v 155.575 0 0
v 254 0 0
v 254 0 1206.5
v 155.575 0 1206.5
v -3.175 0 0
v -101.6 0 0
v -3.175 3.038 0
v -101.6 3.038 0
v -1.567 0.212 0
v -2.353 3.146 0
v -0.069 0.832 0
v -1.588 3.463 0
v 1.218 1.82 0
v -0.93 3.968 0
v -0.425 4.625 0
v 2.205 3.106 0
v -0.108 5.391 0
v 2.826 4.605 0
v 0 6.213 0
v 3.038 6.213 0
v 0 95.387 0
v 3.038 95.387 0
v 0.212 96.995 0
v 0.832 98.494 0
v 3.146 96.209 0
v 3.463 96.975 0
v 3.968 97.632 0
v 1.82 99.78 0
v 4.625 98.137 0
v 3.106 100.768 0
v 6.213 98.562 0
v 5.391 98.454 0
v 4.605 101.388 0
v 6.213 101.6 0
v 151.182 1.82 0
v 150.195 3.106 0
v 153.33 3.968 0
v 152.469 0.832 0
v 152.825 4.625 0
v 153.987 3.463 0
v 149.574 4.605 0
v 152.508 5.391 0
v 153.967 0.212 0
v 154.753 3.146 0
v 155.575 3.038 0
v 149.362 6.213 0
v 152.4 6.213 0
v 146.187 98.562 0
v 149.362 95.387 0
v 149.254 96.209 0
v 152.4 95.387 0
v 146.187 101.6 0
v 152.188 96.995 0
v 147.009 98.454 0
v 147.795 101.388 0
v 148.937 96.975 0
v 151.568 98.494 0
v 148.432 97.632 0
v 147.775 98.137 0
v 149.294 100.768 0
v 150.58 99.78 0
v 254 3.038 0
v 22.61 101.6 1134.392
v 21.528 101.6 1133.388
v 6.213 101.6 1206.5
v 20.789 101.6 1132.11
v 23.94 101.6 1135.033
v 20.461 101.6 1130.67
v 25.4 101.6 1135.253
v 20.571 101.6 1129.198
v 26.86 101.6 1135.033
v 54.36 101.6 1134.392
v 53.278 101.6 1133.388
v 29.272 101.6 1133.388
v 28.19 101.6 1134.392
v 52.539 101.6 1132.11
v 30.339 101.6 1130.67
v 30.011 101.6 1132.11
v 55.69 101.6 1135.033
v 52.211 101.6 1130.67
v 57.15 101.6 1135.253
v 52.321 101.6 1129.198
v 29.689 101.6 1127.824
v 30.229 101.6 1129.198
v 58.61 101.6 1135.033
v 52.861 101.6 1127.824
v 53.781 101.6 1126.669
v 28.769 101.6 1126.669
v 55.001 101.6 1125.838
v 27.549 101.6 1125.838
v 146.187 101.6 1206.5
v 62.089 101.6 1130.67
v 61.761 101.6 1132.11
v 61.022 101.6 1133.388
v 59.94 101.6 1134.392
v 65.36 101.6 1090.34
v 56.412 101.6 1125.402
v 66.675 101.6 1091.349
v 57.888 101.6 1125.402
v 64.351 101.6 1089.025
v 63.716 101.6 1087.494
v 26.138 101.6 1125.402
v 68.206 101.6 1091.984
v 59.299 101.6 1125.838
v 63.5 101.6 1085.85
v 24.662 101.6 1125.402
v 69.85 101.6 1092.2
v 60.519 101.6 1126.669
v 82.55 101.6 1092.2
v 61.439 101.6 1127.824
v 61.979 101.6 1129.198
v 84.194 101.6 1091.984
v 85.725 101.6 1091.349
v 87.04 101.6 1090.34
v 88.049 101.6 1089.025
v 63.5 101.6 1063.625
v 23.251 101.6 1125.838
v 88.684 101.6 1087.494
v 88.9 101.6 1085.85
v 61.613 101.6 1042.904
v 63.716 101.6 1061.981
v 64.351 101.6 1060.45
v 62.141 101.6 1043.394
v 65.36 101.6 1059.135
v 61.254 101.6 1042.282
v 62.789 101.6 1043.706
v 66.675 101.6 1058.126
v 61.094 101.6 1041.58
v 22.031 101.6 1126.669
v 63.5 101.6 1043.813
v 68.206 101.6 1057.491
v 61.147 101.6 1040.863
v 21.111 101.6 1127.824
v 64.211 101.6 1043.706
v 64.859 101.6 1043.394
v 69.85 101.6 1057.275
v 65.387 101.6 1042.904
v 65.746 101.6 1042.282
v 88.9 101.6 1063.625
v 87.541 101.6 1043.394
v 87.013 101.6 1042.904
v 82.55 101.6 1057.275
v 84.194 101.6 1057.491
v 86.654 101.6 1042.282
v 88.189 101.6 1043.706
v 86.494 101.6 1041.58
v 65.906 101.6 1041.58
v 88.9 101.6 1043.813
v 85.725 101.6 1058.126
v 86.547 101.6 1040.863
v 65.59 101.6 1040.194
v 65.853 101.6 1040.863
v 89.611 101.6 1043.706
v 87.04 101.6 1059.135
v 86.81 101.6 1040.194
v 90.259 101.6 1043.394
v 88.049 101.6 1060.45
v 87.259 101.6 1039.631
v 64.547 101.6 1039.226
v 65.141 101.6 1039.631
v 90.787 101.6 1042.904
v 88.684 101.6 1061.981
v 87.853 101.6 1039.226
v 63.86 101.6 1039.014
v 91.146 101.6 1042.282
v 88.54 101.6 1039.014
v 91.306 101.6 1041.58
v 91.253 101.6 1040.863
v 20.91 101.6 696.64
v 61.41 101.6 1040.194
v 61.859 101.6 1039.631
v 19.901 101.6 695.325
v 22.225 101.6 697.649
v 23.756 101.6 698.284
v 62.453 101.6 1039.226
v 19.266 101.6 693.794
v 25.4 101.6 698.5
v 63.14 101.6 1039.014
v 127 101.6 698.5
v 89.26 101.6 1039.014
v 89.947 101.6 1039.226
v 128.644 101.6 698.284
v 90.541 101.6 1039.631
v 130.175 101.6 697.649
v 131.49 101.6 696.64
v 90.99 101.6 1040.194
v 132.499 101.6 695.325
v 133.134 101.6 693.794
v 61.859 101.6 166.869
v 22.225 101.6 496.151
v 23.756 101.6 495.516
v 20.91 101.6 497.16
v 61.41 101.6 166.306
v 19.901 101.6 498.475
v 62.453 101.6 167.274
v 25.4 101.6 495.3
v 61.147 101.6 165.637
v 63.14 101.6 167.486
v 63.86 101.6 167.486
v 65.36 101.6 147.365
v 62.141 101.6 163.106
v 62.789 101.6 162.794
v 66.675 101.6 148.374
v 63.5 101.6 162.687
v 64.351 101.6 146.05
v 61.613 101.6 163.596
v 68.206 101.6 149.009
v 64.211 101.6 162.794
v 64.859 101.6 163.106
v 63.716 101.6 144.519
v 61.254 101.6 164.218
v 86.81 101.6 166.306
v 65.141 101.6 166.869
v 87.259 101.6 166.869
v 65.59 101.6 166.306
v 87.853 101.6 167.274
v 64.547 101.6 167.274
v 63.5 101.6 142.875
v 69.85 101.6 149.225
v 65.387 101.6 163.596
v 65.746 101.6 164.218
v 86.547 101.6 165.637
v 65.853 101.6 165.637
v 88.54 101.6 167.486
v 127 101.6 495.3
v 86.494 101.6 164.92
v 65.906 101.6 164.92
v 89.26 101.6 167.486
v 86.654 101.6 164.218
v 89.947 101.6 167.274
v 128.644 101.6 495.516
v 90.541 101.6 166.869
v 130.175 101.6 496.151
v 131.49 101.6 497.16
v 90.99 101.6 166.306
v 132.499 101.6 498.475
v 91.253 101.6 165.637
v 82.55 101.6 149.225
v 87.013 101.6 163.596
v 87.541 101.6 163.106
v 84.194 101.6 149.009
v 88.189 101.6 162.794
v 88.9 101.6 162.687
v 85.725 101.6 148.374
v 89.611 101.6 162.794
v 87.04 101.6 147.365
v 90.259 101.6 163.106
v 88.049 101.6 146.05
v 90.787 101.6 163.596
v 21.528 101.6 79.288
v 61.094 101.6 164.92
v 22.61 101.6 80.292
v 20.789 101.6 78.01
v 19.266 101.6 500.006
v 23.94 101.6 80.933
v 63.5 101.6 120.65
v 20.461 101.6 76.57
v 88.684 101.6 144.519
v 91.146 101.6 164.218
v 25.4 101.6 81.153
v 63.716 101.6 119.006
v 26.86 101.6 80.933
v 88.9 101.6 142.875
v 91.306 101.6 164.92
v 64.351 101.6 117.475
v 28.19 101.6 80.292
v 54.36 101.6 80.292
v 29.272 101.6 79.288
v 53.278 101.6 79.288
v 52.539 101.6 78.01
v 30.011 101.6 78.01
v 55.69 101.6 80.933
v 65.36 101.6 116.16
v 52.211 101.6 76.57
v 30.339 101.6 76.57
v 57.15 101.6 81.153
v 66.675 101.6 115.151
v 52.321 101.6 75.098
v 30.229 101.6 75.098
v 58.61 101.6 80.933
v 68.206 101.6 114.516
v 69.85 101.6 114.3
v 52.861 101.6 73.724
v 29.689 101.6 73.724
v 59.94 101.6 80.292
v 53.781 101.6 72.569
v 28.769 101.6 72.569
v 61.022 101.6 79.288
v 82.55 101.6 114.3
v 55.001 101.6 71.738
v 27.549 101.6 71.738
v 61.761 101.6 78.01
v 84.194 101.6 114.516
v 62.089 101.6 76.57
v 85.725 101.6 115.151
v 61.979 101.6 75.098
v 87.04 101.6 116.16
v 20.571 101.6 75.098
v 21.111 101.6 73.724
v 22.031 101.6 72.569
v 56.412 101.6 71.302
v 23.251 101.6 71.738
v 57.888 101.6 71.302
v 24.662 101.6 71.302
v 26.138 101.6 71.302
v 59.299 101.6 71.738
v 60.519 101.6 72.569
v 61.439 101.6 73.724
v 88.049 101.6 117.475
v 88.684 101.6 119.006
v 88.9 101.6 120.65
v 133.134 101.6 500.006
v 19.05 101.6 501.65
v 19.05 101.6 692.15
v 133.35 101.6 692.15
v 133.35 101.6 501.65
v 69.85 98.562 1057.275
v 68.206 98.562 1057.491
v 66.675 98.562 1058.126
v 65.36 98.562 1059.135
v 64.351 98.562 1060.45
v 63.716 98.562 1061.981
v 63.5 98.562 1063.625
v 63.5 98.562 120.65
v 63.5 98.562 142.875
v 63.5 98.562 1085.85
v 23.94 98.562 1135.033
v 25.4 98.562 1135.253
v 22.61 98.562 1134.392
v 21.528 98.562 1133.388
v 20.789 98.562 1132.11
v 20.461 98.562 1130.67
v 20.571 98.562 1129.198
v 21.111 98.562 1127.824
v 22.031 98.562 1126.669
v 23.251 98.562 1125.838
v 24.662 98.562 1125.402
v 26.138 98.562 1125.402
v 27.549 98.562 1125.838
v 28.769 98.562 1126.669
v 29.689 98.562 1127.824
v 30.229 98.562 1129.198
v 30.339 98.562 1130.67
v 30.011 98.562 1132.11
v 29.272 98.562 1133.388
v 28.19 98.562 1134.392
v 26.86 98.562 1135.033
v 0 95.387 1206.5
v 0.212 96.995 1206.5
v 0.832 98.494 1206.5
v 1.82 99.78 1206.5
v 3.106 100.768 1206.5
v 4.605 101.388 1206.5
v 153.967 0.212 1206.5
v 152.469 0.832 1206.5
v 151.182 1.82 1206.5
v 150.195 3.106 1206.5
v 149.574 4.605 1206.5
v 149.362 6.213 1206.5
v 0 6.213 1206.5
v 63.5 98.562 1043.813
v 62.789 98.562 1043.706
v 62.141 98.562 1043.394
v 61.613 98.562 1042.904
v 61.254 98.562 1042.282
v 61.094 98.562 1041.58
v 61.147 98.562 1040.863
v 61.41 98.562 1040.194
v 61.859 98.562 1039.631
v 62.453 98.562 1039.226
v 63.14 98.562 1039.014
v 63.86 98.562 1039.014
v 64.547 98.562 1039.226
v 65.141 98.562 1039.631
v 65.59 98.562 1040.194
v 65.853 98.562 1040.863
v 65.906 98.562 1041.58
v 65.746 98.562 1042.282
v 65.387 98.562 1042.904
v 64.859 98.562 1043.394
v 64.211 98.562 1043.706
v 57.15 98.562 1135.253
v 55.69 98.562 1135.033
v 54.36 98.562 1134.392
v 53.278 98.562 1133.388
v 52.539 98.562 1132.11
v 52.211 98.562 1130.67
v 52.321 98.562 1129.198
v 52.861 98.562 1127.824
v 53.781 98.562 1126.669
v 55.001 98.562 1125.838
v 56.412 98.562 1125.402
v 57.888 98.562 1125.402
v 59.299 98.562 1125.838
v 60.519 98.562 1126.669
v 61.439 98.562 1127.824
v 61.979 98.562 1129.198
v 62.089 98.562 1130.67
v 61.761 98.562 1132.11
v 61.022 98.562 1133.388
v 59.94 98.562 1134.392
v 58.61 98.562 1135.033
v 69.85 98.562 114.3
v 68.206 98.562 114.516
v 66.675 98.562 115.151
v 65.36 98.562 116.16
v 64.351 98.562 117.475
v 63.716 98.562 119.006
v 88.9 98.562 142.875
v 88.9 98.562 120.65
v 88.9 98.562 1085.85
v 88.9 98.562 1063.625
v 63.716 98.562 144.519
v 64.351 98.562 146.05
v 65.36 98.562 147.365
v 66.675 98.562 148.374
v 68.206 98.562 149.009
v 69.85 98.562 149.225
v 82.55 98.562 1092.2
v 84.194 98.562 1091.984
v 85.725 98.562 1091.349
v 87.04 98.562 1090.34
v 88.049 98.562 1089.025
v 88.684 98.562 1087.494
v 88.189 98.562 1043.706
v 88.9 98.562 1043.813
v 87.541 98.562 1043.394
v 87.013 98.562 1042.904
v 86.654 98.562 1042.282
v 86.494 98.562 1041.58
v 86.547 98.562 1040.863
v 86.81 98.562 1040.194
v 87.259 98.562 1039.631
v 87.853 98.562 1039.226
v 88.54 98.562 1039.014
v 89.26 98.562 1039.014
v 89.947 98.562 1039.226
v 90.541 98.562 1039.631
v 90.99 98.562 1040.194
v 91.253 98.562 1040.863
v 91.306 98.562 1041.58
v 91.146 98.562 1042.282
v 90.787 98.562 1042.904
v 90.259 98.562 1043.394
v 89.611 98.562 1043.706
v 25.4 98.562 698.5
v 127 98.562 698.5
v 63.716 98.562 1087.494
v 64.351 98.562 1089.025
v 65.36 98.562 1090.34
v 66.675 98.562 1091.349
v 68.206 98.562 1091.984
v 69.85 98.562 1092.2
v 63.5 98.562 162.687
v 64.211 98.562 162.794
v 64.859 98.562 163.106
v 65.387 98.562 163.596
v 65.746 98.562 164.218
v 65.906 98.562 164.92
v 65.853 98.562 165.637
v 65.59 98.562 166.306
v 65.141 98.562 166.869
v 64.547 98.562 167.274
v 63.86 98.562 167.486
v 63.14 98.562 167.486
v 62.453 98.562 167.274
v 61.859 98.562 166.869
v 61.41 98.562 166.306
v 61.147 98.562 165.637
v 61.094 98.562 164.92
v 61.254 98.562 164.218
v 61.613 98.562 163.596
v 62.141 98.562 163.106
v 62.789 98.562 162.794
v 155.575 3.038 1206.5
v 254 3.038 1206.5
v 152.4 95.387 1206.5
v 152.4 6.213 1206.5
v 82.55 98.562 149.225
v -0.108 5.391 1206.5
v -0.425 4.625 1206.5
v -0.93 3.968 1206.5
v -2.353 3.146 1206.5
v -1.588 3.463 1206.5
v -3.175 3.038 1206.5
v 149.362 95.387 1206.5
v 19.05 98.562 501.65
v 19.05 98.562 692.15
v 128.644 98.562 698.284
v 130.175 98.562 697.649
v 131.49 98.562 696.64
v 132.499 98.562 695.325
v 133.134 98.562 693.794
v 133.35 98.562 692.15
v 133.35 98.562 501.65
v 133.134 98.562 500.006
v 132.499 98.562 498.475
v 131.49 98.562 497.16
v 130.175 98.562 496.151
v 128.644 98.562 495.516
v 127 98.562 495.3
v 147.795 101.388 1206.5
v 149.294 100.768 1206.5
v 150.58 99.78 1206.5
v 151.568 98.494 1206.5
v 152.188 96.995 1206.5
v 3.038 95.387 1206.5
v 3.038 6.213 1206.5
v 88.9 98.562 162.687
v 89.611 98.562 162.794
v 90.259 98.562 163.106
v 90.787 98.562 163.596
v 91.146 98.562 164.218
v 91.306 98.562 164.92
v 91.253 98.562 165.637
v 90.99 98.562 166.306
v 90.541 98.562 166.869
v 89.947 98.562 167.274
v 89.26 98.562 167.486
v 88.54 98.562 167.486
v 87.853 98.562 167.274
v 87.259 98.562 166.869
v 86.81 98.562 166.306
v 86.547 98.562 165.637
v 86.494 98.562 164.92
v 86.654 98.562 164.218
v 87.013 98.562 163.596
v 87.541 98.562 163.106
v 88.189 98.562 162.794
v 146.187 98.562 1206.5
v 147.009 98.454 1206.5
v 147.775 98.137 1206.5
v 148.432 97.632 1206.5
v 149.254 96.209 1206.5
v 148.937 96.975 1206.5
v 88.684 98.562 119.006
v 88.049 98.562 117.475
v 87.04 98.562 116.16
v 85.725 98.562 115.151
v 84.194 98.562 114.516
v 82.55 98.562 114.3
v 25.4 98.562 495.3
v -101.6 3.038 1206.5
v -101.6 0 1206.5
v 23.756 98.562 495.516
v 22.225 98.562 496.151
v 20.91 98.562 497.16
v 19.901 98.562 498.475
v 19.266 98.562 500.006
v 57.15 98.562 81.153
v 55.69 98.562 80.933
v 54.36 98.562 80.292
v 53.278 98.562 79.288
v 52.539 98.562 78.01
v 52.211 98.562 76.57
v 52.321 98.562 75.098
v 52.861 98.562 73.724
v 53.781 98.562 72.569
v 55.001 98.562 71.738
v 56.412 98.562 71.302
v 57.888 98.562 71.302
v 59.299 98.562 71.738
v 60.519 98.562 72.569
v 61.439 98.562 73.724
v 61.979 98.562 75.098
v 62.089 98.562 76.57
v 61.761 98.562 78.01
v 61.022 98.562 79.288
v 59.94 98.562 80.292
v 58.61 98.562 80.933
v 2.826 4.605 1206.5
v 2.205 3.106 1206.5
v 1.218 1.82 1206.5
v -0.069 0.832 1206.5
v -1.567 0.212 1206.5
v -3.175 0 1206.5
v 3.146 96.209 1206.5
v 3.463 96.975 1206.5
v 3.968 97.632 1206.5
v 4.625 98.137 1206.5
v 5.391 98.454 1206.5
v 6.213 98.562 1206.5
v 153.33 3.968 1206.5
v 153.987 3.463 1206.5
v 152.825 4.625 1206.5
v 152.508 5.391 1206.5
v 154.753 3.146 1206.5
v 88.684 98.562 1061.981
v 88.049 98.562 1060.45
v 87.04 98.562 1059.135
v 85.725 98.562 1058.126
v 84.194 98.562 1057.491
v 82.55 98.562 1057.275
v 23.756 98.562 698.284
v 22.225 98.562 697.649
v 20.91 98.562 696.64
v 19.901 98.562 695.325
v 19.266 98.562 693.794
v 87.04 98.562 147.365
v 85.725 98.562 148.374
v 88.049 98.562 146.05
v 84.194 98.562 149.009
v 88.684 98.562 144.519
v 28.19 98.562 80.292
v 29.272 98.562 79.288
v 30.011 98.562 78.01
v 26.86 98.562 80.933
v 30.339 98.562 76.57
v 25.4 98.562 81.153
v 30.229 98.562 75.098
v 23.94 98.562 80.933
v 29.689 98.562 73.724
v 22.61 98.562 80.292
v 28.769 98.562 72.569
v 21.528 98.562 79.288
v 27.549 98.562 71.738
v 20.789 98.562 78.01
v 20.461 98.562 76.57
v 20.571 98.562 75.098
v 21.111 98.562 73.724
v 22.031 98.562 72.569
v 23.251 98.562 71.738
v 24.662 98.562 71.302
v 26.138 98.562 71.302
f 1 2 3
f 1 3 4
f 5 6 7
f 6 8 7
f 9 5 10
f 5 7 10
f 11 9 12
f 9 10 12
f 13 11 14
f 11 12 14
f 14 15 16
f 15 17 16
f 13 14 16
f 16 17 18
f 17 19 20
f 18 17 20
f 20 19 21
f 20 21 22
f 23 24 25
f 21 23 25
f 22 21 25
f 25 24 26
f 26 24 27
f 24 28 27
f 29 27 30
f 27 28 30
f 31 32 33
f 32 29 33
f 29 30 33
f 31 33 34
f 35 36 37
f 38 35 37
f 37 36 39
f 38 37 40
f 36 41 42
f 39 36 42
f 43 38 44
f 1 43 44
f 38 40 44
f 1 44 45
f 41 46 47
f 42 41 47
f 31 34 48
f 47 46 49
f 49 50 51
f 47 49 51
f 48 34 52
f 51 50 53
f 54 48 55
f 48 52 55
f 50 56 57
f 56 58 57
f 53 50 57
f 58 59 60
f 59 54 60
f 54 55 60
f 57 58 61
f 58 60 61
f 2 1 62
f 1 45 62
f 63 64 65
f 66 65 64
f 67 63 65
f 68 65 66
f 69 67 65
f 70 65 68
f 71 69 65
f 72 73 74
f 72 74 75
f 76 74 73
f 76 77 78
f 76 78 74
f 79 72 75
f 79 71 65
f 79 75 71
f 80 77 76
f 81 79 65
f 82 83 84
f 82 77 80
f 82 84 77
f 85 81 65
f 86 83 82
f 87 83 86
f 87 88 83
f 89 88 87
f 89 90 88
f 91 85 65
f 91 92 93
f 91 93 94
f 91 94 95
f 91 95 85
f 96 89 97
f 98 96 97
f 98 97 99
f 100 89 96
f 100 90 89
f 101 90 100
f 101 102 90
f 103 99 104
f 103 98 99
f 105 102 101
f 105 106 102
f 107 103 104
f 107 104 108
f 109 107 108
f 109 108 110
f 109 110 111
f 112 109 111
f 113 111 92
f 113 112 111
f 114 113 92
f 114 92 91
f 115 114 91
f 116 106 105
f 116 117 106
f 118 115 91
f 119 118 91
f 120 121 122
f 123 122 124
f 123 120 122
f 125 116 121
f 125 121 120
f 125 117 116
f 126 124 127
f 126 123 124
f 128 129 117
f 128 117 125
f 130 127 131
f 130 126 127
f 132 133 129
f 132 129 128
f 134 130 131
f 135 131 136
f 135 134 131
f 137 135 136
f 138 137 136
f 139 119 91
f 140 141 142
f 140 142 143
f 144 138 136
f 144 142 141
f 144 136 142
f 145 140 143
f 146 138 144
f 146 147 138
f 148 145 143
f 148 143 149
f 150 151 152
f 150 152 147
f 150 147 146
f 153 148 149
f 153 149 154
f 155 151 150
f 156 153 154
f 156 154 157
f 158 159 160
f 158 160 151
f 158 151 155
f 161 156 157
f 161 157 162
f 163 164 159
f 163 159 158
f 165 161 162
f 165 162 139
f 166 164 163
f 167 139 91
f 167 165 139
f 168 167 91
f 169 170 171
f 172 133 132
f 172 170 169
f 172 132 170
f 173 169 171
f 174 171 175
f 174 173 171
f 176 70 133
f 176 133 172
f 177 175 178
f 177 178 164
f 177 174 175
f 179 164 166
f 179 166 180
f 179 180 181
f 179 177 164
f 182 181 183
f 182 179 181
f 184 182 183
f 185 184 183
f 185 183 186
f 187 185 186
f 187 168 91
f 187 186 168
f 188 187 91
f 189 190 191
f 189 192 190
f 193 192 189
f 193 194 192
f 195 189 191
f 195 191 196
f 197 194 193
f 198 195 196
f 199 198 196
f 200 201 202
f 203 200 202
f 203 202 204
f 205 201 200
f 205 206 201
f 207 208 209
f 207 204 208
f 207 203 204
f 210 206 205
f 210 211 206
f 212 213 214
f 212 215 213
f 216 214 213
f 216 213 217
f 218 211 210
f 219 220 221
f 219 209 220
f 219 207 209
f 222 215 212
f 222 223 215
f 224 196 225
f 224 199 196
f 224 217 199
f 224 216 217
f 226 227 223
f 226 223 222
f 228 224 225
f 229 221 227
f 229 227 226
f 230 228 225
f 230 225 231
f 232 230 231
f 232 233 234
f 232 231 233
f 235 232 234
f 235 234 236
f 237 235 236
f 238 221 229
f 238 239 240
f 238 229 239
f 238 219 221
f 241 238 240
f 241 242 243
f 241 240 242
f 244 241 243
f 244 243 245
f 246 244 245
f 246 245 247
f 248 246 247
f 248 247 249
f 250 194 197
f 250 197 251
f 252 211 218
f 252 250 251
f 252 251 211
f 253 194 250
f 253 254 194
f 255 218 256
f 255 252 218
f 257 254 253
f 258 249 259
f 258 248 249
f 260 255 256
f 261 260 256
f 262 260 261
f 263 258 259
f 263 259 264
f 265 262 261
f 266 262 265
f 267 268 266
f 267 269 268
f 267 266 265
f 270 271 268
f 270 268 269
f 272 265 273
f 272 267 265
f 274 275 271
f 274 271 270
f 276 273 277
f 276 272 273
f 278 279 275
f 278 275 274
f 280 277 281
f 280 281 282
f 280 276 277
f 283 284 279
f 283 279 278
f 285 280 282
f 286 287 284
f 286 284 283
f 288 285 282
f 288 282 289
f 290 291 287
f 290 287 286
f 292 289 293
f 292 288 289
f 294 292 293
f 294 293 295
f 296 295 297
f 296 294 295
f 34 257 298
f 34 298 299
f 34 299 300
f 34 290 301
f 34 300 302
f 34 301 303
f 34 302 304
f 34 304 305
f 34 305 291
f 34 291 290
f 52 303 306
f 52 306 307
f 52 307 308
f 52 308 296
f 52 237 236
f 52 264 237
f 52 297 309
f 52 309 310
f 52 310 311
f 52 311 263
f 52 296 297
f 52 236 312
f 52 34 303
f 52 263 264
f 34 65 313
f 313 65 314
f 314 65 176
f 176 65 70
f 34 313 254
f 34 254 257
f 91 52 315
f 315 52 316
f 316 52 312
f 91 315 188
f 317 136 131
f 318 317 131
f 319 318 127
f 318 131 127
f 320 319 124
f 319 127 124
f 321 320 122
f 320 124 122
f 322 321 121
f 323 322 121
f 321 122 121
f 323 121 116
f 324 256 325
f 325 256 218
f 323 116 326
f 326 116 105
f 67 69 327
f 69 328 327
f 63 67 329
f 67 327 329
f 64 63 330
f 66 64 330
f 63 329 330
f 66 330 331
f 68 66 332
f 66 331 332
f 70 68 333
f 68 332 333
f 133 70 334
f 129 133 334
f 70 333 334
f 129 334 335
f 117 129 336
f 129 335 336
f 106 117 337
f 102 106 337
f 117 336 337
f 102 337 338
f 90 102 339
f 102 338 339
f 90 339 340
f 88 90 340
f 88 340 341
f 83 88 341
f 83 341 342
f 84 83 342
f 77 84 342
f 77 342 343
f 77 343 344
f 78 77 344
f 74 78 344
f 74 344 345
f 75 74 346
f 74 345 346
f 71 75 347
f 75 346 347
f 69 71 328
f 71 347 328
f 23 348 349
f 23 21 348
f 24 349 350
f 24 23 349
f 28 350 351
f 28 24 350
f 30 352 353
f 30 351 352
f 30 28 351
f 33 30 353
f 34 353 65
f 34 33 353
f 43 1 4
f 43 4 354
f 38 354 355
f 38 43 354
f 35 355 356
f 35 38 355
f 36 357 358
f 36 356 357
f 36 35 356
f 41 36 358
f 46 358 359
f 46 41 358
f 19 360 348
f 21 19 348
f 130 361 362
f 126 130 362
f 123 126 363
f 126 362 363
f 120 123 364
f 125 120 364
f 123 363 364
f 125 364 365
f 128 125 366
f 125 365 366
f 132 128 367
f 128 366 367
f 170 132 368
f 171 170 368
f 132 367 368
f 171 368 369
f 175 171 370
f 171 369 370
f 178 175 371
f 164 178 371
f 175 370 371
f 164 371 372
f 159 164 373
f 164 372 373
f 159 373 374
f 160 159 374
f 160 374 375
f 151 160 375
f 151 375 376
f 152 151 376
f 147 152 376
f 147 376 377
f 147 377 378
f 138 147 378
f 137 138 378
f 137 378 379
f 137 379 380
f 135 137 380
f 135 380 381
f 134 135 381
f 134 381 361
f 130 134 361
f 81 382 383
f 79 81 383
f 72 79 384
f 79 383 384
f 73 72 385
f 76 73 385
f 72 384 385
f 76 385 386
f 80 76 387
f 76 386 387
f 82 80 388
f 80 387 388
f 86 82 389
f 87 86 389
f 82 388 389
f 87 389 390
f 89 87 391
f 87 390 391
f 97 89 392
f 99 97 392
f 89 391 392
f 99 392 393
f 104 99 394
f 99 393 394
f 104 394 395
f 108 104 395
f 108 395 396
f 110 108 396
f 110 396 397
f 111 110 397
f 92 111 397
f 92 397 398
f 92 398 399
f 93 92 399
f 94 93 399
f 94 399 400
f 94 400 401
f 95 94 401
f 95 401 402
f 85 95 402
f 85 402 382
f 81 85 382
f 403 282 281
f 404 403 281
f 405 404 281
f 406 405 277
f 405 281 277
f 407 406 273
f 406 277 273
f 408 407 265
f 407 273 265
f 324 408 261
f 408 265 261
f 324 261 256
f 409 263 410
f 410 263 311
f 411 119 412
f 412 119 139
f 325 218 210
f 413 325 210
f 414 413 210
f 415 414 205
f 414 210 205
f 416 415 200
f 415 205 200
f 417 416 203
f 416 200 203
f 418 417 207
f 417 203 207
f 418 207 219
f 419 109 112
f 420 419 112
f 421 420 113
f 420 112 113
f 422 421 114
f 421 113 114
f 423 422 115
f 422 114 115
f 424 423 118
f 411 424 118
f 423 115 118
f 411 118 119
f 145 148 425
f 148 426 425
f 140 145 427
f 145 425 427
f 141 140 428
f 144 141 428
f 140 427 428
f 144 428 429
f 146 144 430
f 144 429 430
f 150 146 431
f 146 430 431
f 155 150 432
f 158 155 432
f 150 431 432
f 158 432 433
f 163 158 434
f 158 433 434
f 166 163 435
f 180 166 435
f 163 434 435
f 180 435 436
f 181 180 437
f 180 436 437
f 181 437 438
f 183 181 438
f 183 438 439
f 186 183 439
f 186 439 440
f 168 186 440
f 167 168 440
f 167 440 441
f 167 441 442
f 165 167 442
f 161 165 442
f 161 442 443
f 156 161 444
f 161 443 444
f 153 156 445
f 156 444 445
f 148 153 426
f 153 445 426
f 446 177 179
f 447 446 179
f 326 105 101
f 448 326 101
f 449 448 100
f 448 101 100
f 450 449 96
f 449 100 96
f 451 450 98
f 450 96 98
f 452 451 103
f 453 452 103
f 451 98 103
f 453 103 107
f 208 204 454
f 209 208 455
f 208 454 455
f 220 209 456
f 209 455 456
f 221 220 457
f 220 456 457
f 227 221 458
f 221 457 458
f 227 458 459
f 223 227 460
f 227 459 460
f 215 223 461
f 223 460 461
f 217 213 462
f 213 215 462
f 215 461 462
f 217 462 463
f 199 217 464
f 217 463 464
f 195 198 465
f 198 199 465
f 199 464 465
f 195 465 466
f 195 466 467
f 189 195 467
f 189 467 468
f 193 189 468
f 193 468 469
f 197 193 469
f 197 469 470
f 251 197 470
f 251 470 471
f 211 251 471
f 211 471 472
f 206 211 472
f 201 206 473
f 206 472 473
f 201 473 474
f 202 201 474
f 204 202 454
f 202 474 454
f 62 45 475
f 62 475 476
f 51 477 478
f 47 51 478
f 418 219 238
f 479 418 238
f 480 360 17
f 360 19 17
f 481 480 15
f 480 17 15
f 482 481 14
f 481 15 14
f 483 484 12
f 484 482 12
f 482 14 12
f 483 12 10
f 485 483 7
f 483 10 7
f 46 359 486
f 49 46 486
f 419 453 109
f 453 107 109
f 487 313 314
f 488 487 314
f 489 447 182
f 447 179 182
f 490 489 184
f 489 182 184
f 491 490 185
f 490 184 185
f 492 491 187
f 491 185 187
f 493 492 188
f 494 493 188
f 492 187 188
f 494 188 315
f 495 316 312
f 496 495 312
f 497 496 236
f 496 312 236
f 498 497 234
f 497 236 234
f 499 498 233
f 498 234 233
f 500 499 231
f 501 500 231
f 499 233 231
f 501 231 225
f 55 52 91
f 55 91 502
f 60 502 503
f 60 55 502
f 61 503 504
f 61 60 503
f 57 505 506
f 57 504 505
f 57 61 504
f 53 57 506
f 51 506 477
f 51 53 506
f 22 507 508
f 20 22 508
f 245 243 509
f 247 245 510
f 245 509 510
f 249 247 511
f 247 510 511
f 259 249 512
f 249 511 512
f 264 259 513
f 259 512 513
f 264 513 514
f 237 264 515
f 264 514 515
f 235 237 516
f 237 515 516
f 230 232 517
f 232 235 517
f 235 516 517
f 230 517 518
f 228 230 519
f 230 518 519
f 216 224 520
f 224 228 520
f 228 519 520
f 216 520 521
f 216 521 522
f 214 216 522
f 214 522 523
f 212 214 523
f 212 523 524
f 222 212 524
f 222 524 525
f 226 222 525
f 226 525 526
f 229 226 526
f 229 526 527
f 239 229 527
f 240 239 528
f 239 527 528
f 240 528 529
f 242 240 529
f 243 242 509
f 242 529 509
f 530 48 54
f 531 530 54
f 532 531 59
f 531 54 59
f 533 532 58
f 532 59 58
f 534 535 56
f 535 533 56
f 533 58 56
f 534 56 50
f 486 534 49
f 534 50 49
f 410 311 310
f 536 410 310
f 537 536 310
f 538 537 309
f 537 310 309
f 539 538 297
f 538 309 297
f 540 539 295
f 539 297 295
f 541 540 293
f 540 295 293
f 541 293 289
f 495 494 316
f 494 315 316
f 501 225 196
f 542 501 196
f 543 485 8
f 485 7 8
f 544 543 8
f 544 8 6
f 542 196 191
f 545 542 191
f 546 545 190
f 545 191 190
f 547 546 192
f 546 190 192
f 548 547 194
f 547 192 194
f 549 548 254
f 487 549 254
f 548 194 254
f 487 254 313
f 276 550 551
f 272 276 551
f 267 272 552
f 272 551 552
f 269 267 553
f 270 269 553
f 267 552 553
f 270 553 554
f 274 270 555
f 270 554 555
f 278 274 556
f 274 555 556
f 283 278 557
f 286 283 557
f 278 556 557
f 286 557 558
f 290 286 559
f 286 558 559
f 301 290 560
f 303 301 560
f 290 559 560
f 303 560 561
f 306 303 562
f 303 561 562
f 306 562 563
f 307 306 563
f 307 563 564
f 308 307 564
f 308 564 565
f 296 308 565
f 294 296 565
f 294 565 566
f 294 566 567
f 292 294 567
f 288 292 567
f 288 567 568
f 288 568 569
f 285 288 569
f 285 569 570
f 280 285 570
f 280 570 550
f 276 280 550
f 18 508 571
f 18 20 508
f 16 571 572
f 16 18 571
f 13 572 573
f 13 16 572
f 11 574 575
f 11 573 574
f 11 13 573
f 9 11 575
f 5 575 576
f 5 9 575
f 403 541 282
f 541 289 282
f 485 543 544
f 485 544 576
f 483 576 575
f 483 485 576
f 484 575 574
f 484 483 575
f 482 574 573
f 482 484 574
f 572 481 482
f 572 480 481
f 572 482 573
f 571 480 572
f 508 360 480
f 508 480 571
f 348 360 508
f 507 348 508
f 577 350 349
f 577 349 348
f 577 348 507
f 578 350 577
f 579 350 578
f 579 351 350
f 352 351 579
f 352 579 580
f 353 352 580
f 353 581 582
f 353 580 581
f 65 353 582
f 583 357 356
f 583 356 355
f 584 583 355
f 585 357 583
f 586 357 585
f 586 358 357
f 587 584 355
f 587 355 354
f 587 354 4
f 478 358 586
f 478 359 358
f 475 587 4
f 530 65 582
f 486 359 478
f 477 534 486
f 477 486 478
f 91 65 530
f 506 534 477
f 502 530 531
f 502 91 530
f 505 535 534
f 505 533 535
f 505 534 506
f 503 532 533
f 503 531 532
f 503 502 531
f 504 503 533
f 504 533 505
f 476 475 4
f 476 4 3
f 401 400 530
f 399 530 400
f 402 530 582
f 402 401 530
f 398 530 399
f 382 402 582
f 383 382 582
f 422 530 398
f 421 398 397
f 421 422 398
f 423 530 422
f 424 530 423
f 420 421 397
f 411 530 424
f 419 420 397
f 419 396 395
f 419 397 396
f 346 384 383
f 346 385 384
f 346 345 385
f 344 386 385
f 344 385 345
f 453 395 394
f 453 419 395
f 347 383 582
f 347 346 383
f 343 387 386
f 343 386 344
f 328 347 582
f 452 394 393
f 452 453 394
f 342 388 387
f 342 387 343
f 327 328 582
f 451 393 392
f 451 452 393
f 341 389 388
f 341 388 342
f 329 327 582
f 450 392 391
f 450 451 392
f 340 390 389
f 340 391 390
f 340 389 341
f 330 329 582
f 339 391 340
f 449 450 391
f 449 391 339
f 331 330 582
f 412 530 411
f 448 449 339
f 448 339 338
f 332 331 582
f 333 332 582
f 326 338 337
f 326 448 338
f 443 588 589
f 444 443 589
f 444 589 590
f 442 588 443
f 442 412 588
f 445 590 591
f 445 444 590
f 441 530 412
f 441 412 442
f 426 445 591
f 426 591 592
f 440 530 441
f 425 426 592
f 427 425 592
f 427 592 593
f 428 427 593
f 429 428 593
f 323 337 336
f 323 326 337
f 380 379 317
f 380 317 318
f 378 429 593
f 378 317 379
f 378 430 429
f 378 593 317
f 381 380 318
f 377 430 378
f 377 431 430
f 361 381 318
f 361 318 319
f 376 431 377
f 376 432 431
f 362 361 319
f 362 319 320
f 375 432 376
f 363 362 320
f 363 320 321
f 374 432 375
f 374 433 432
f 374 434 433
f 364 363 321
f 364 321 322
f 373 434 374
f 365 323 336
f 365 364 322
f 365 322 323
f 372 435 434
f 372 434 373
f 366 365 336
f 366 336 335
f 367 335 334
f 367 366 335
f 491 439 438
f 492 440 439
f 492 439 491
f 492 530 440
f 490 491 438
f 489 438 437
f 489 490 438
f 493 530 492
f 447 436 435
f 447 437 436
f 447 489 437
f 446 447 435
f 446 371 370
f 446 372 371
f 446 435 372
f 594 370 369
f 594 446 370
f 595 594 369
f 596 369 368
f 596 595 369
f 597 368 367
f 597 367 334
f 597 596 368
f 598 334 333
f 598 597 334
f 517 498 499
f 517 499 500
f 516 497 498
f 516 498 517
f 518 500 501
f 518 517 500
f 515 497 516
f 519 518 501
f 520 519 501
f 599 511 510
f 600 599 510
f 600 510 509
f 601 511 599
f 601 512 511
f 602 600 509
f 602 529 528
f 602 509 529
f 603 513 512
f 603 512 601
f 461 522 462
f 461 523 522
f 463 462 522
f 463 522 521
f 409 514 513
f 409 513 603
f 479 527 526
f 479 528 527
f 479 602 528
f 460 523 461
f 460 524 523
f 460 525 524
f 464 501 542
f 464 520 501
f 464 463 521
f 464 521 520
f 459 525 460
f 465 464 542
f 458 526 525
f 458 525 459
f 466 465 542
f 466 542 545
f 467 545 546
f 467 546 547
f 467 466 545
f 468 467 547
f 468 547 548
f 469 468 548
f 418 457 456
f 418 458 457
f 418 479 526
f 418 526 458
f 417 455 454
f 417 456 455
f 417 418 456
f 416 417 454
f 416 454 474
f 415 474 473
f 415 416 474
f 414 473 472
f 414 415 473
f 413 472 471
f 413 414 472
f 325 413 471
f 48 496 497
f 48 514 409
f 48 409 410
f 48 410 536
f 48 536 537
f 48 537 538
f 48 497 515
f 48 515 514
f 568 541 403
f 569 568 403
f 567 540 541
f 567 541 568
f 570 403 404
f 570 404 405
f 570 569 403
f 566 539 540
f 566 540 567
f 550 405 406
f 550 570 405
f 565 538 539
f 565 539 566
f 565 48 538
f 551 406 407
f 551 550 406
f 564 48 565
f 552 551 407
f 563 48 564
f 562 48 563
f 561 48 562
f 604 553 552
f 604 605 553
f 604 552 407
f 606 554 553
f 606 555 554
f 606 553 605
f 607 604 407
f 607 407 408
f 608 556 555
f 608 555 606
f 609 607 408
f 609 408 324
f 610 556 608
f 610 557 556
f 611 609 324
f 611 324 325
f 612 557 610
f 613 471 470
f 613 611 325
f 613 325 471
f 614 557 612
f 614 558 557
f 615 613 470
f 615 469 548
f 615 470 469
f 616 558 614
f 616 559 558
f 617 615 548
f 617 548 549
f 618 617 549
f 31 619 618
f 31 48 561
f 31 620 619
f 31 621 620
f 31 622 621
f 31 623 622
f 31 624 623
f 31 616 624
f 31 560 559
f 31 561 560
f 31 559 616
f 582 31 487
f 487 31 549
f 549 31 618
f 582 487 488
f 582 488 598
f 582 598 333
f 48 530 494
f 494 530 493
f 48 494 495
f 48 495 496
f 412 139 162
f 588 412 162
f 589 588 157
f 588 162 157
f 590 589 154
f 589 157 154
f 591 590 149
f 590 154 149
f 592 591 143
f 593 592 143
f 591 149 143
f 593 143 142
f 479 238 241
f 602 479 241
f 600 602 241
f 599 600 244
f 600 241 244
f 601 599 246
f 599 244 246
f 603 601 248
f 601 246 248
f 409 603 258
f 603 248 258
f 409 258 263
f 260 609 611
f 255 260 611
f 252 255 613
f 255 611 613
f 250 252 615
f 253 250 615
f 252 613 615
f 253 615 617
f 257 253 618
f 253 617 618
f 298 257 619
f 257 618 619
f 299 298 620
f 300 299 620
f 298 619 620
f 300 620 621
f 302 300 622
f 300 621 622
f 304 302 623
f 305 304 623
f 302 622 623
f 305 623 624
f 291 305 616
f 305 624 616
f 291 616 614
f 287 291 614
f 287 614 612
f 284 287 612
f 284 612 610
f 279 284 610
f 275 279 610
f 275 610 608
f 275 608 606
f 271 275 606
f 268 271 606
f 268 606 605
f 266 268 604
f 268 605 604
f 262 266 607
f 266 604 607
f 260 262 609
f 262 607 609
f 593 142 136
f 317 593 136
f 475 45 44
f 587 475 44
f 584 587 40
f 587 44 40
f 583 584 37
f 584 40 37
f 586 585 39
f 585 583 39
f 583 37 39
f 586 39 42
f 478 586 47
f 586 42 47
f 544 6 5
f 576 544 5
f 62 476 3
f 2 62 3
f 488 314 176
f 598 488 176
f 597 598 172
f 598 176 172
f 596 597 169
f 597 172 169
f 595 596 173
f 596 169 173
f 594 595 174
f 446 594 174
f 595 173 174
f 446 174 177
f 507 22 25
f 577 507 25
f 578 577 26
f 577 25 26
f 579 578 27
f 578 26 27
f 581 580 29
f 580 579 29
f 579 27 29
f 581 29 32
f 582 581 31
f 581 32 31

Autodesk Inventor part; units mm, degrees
ref_plane "YZ Plane" through (0, 0, 0) normal (1, 0, 0) x (0, 1, 0)
ref_plane "XZ Plane" through (0, 0, 0) normal (0, 1, 0) x (-1, 0, 0)
sketch "Sketch1" plane through (0, 0, 0) normal (0, 0, 1) x (1, 0, 0)
  line L0 (0, 6.2128) -> (0, 95.3872)
  line L1 (6.2128, 101.6) -> (146.1872, 101.6)
  line L2 (152.4, 95.3872) -> (152.4, 6.2128)
  line L3 (149.3622, 6.2128) -> (149.3622, 95.3872)
  line L4 (146.1872, 98.5622) -> (6.2128, 98.5622)
  line L5 (3.0378, 95.3872) -> (3.0378, 6.2128)
  arc A0 (6.2128, 98.5622) -> (3.0378, 95.3872) centre (6.2128, 95.3872) ccw
  arc A1 (149.3622, 95.3872) -> (146.1872, 98.5622) centre (146.1872, 95.3872) ccw
  arc A2 (6.2128, 101.6) -> (0, 95.3872) centre (6.2128, 95.3872) ccw
  arc A3 (152.4, 95.3872) -> (146.1872, 101.6) centre (146.1872, 95.3872) ccw
  line L6 (-101.6, 0) -> (-3.175, 0)
  line L7 (-3.175, 3.0378) -> (-101.6, 3.0378)
  line L8 (-101.6, 3.0378) -> (-101.6, 0)
  line L9 (254, 0) -> (155.575, 0)
  line L10 (155.575, 3.0378) -> (254, 3.0378)
  line L11 (254, 3.0378) -> (254, 0)
  arc A4 (-3.175, 3.0378) -> (0, 6.2128) centre (-3.175, 6.2128) ccw
  arc A5 (152.4, 6.2128) -> (155.575, 3.0378) centre (155.575, 6.2128) ccw
  arc A6 (-3.175, 0) -> (3.0378, 6.2128) centre (-3.175, 6.2128) ccw
  arc A7 (149.3622, 6.2128) -> (155.575, 0) centre (155.575, 6.2128) ccw
  point P0 (0, 0)
  point P1 (0, 101.6)
  point P2 (152.4, 101.6)
  point P3 (152.4, 3.0378)
  point P4 (149.3622, 0)
  dimension "d0" = 101.6
  dimension "d1" = 3.0378
  dimension "d2" = 3.0378
  dimension "d3" = 152.4
  dimension "d4" = 3.175
  dimension "d5" = 6.2128
  dimension "d31" = 3.0378
  dimension "d32" = 3.0378
  dimension "d33" = 3.175
  dimension "d34" = 6.2128
  dimension "d35" = 101.6
extrude "Extrusion1" add sketch "Sketch1" along normal blind 1206.5
hole "Hole1" at (25.4, 101.6, 1130.3) direction (0, -1, 0) diameter 9.906 end through all
pattern_linear "Rectangular Pattern1" count 2 spacing 31.75 along (1, 0, 0) of "Hole1"
pattern_linear "Rectangular Pattern2" count 2 spacing 1054.1 along (0, 0, -1) of "Hole1", "Rectangular Pattern1"
sketch "Sketch3" plane through (6.2128, 101.6, 0) normal (0, 1, 0) x (1, 0, 0)
  line L0 (0, -1206.5) -> (139.9743, -1206.5) projected
  line L1 (19.1872, -698.5) -> (120.7872, -698.5)
  line L2 (127.1372, -692.15) -> (127.1372, -501.65)
  line L3 (120.7872, -495.3) -> (19.1872, -495.3)
  line L4 (12.8372, -501.65) -> (12.8372, -692.15)
  arc A0 (12.8372, -692.15) -> (19.1872, -698.5) centre (19.1872, -692.15) ccw
  arc A1 (19.1872, -495.3) -> (12.8372, -501.65) centre (19.1872, -501.65) ccw
  arc A2 (127.1372, -501.65) -> (120.7872, -495.3) centre (120.7872, -501.65) ccw
  arc A3 (120.7872, -698.5) -> (127.1372, -692.15) centre (120.7872, -692.15) ccw
  line L5 (146.1872, 0) -> (146.1872, -1206.5) projected
  point P0 (-6.2128, 0)
  dimension "d36" = 6.35
  dimension "d37" = 203.2
  dimension "d38" = 114.3
  dimension "d39" = 19.05
  dimension "d40" = 508
extrude "Extrusion2" cut sketch "Sketch3" against normal blind 25.4
sketch "Sketch4" plane through (6.2128, 101.6, 0) normal (0, 1, 0) x (1, 0, 0)
  line L0 (0, -1206.5) -> (139.9743, -1206.5) projected
  line L1 (139.9743, 0) -> (139.9743, -1206.5) projected
  line L2 (0, 0) -> (0, -1206.5) projected
  line L3 (63.6372, -1092.2) -> (76.3372, -1092.2)
  line L4 (82.6872, -1085.85) -> (82.6872, -1063.625)
  line L5 (76.3372, -1057.275) -> (63.6372, -1057.275)
  line L6 (57.2872, -1063.625) -> (57.2872, -1085.85)
  arc A0 (57.2872, -1085.85) -> (63.6372, -1092.2) centre (63.6372, -1085.85) ccw
  arc A1 (76.3372, -1092.2) -> (82.6872, -1085.85) centre (76.3372, -1085.85) ccw
  arc A2 (82.6872, -1063.625) -> (76.3372, -1057.275) centre (76.3372, -1063.625) ccw
  arc A3 (63.6372, -1057.275) -> (57.2872, -1063.625) centre (63.6372, -1063.625) ccw
  point P0 (-6.2128, 0)
  point P1 (57.2872, -1092.2)
  point P2 (82.6872, -1057.275)
  point P3 (57.2872, -1057.275)
  dimension "d43" = 114.3
  dimension "d44" = 57.2872
  dimension "d45" = 25.4
  dimension "d46" = 139.9743
  dimension "d47" = 34.925
  dimension "d48" = 6.35
extrude "Extrusion3" cut sketch "Sketch4" against normal blind 25.4
hole "Hole2" at (88.9, 101.6, 1041.4) direction (0, -1, 0) diameter 4.826 depth 25.4 tip angle 118
pattern_linear "Rectangular Pattern3" count 2 spacing 25.4 along (-1, 0, 0) of "Hole2"
ref_plane "Work Plane1" through (0, 0, 603.25) normal (0, 0, -1) x (-1, 0, 0)
mirror "Mirror1" about plane through (0, 0, 603.25) normal (0, 0, -1) of "Extrusion3", "Hole2", "Rectangular Pattern3"
equation "\"d2\" = d1"
equation "\"d5\" = d4 + d1"
equation "\"d31\" = d1"
equation "\"d32\" = d1"
equation "\"d33\" = d4"
equation "\"d34\" = d5"
equation "\"d44\" = -0.5 * d45 + 0.5 * d46"
properties part number "GE-12021" material "Steel"
